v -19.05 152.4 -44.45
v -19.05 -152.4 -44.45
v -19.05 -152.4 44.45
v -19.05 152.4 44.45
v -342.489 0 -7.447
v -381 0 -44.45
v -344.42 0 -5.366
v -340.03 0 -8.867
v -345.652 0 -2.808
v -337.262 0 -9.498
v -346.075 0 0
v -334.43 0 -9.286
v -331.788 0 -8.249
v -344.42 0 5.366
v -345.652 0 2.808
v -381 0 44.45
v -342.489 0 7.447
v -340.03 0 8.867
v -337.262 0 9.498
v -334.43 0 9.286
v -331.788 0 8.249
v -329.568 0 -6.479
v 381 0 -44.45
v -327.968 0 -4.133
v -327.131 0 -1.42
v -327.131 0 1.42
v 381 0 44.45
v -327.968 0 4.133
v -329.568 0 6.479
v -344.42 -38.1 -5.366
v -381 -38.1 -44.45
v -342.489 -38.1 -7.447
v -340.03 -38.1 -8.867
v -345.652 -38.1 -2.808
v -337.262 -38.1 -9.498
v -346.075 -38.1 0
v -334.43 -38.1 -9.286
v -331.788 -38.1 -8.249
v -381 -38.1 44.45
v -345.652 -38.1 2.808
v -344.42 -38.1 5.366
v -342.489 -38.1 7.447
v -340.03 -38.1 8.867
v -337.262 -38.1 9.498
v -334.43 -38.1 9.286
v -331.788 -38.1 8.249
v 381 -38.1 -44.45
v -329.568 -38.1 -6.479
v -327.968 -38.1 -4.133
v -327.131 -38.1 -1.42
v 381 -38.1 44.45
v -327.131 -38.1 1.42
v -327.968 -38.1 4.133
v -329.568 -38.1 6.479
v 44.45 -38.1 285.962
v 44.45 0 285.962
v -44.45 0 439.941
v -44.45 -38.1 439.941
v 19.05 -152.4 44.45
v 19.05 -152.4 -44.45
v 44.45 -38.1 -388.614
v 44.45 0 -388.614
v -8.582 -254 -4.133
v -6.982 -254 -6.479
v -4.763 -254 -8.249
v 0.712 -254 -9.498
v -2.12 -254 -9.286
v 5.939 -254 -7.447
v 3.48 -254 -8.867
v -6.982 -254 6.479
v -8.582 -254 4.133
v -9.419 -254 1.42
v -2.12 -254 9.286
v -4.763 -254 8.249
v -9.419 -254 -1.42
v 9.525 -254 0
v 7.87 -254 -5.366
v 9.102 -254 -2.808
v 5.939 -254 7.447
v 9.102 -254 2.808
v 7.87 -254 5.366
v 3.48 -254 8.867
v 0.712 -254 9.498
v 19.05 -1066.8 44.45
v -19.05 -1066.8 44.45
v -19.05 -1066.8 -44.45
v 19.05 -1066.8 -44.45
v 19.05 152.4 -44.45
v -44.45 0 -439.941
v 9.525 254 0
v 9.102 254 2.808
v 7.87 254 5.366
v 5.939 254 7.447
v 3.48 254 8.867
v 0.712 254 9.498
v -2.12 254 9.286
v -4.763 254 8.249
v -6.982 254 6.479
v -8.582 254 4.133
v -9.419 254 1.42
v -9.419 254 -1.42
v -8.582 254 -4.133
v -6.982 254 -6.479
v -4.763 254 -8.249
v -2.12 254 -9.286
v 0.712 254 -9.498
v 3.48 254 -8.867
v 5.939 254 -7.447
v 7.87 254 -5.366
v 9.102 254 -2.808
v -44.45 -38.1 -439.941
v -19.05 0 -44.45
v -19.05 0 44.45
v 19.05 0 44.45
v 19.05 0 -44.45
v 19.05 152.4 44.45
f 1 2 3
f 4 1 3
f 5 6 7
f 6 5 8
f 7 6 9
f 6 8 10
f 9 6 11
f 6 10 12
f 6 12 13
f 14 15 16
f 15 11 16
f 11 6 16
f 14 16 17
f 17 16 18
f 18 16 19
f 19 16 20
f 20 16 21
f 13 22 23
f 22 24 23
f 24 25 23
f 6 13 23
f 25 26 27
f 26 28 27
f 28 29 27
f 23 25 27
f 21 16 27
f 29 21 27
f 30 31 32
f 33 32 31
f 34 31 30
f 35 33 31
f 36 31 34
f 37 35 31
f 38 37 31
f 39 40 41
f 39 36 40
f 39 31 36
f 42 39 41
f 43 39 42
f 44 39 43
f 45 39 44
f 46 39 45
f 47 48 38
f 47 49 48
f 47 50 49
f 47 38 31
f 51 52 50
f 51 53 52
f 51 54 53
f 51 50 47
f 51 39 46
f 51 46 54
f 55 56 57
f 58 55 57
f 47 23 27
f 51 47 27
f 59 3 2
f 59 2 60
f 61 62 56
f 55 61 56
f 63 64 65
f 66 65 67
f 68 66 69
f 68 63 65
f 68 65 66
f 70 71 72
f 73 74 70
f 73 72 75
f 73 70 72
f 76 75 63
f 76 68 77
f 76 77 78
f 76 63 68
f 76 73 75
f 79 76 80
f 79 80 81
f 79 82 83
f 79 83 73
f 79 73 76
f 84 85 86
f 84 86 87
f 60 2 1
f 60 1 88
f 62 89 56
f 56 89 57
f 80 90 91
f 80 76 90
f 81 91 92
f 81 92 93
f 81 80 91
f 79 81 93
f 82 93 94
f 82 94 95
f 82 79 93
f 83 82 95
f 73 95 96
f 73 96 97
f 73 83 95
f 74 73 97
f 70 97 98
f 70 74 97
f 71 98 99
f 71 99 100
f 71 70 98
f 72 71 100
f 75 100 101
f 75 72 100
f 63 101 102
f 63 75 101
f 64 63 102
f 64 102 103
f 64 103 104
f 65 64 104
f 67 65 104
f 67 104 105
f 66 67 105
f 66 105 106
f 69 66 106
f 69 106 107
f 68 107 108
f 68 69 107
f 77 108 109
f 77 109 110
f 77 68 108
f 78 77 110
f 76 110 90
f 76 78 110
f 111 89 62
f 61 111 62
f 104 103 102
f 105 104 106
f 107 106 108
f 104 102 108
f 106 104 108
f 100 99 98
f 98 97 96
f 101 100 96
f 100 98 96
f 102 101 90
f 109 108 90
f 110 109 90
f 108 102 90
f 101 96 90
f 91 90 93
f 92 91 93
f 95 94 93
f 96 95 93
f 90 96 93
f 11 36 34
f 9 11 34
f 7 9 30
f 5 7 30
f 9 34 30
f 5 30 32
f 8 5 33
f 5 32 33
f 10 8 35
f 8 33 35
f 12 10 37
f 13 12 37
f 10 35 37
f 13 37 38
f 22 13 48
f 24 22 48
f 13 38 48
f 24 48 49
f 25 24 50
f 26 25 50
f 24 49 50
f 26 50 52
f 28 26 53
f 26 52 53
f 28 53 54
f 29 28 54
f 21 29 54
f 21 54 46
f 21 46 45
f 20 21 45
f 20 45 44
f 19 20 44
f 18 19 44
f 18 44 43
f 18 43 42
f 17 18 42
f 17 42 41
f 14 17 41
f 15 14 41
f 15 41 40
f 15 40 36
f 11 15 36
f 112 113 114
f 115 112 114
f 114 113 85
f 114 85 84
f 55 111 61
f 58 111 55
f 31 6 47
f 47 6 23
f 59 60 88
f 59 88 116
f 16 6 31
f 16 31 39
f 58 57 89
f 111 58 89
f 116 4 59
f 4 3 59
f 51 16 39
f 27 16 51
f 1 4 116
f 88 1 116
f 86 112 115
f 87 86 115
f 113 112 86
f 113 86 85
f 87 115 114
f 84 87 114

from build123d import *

# Parameters (mm, degrees)
F2_W      = 38.1
F2_H      = 88.9
F3_DEPTH  = 152.4
F5_DEPTH  = 38.1
F6_W      = 762
F6_H      = 88.9
F7_DEPTH  = 38.1
F8_D      = 19.05
F9_R      = 9.525
F10_DEPTH = 254
F11_DEPTH = 1066.8


# Not quite as in the source:
# - a variable given as a bare number and used for a length is read in inches; the dataset says mm whatever the document's units were


with BuildPart() as f3:
    # F2 (on Front) → F3 (new body, symmetric)
    with BuildSketch(Plane.XZ):
        Rectangle(F2_W, F2_H)
    extrude(amount=F3_DEPTH, both=True)


with BuildPart() as f5:
    # F4 (on Front) → F5 (new body)
    with BuildSketch(Plane.XZ):
        Polygon((-44.45, 439.9409051225), (-44.45, -439.9409051225), (44.45, -388.6144661915), (44.45, 285.9615883296), align=None)
    extrude(amount=F5_DEPTH)


with BuildPart() as f7:
    # F6 (on Front) → F7 (new body)
    with BuildSketch(Plane.XZ):
        Rectangle(F6_W, F6_H)
    extrude(amount=F7_DEPTH)

    # F8 (through all)
    with Locations(Plane(origin=(0, 0, 0), x_dir=(1, 0, 0), z_dir=(0, 1, 0))):
        with Locations((-336.55, 0)):
            Hole(F8_D / 2)


with BuildPart() as f10:
    # F9 (on Front) → F10 (new body, symmetric)
    with BuildSketch(Plane.XZ):
        Circle(F9_R)
    extrude(amount=F10_DEPTH, both=True)


with BuildPart() as f11:
    # F2 (on Front) → F11 (new body)
    with BuildSketch(Plane.XZ):
        Rectangle(F2_W, F2_H)
    extrude(amount=F11_DEPTH)


solid = Compound([f3.part, f5.part, f7.part, f10.part, f11.part])
